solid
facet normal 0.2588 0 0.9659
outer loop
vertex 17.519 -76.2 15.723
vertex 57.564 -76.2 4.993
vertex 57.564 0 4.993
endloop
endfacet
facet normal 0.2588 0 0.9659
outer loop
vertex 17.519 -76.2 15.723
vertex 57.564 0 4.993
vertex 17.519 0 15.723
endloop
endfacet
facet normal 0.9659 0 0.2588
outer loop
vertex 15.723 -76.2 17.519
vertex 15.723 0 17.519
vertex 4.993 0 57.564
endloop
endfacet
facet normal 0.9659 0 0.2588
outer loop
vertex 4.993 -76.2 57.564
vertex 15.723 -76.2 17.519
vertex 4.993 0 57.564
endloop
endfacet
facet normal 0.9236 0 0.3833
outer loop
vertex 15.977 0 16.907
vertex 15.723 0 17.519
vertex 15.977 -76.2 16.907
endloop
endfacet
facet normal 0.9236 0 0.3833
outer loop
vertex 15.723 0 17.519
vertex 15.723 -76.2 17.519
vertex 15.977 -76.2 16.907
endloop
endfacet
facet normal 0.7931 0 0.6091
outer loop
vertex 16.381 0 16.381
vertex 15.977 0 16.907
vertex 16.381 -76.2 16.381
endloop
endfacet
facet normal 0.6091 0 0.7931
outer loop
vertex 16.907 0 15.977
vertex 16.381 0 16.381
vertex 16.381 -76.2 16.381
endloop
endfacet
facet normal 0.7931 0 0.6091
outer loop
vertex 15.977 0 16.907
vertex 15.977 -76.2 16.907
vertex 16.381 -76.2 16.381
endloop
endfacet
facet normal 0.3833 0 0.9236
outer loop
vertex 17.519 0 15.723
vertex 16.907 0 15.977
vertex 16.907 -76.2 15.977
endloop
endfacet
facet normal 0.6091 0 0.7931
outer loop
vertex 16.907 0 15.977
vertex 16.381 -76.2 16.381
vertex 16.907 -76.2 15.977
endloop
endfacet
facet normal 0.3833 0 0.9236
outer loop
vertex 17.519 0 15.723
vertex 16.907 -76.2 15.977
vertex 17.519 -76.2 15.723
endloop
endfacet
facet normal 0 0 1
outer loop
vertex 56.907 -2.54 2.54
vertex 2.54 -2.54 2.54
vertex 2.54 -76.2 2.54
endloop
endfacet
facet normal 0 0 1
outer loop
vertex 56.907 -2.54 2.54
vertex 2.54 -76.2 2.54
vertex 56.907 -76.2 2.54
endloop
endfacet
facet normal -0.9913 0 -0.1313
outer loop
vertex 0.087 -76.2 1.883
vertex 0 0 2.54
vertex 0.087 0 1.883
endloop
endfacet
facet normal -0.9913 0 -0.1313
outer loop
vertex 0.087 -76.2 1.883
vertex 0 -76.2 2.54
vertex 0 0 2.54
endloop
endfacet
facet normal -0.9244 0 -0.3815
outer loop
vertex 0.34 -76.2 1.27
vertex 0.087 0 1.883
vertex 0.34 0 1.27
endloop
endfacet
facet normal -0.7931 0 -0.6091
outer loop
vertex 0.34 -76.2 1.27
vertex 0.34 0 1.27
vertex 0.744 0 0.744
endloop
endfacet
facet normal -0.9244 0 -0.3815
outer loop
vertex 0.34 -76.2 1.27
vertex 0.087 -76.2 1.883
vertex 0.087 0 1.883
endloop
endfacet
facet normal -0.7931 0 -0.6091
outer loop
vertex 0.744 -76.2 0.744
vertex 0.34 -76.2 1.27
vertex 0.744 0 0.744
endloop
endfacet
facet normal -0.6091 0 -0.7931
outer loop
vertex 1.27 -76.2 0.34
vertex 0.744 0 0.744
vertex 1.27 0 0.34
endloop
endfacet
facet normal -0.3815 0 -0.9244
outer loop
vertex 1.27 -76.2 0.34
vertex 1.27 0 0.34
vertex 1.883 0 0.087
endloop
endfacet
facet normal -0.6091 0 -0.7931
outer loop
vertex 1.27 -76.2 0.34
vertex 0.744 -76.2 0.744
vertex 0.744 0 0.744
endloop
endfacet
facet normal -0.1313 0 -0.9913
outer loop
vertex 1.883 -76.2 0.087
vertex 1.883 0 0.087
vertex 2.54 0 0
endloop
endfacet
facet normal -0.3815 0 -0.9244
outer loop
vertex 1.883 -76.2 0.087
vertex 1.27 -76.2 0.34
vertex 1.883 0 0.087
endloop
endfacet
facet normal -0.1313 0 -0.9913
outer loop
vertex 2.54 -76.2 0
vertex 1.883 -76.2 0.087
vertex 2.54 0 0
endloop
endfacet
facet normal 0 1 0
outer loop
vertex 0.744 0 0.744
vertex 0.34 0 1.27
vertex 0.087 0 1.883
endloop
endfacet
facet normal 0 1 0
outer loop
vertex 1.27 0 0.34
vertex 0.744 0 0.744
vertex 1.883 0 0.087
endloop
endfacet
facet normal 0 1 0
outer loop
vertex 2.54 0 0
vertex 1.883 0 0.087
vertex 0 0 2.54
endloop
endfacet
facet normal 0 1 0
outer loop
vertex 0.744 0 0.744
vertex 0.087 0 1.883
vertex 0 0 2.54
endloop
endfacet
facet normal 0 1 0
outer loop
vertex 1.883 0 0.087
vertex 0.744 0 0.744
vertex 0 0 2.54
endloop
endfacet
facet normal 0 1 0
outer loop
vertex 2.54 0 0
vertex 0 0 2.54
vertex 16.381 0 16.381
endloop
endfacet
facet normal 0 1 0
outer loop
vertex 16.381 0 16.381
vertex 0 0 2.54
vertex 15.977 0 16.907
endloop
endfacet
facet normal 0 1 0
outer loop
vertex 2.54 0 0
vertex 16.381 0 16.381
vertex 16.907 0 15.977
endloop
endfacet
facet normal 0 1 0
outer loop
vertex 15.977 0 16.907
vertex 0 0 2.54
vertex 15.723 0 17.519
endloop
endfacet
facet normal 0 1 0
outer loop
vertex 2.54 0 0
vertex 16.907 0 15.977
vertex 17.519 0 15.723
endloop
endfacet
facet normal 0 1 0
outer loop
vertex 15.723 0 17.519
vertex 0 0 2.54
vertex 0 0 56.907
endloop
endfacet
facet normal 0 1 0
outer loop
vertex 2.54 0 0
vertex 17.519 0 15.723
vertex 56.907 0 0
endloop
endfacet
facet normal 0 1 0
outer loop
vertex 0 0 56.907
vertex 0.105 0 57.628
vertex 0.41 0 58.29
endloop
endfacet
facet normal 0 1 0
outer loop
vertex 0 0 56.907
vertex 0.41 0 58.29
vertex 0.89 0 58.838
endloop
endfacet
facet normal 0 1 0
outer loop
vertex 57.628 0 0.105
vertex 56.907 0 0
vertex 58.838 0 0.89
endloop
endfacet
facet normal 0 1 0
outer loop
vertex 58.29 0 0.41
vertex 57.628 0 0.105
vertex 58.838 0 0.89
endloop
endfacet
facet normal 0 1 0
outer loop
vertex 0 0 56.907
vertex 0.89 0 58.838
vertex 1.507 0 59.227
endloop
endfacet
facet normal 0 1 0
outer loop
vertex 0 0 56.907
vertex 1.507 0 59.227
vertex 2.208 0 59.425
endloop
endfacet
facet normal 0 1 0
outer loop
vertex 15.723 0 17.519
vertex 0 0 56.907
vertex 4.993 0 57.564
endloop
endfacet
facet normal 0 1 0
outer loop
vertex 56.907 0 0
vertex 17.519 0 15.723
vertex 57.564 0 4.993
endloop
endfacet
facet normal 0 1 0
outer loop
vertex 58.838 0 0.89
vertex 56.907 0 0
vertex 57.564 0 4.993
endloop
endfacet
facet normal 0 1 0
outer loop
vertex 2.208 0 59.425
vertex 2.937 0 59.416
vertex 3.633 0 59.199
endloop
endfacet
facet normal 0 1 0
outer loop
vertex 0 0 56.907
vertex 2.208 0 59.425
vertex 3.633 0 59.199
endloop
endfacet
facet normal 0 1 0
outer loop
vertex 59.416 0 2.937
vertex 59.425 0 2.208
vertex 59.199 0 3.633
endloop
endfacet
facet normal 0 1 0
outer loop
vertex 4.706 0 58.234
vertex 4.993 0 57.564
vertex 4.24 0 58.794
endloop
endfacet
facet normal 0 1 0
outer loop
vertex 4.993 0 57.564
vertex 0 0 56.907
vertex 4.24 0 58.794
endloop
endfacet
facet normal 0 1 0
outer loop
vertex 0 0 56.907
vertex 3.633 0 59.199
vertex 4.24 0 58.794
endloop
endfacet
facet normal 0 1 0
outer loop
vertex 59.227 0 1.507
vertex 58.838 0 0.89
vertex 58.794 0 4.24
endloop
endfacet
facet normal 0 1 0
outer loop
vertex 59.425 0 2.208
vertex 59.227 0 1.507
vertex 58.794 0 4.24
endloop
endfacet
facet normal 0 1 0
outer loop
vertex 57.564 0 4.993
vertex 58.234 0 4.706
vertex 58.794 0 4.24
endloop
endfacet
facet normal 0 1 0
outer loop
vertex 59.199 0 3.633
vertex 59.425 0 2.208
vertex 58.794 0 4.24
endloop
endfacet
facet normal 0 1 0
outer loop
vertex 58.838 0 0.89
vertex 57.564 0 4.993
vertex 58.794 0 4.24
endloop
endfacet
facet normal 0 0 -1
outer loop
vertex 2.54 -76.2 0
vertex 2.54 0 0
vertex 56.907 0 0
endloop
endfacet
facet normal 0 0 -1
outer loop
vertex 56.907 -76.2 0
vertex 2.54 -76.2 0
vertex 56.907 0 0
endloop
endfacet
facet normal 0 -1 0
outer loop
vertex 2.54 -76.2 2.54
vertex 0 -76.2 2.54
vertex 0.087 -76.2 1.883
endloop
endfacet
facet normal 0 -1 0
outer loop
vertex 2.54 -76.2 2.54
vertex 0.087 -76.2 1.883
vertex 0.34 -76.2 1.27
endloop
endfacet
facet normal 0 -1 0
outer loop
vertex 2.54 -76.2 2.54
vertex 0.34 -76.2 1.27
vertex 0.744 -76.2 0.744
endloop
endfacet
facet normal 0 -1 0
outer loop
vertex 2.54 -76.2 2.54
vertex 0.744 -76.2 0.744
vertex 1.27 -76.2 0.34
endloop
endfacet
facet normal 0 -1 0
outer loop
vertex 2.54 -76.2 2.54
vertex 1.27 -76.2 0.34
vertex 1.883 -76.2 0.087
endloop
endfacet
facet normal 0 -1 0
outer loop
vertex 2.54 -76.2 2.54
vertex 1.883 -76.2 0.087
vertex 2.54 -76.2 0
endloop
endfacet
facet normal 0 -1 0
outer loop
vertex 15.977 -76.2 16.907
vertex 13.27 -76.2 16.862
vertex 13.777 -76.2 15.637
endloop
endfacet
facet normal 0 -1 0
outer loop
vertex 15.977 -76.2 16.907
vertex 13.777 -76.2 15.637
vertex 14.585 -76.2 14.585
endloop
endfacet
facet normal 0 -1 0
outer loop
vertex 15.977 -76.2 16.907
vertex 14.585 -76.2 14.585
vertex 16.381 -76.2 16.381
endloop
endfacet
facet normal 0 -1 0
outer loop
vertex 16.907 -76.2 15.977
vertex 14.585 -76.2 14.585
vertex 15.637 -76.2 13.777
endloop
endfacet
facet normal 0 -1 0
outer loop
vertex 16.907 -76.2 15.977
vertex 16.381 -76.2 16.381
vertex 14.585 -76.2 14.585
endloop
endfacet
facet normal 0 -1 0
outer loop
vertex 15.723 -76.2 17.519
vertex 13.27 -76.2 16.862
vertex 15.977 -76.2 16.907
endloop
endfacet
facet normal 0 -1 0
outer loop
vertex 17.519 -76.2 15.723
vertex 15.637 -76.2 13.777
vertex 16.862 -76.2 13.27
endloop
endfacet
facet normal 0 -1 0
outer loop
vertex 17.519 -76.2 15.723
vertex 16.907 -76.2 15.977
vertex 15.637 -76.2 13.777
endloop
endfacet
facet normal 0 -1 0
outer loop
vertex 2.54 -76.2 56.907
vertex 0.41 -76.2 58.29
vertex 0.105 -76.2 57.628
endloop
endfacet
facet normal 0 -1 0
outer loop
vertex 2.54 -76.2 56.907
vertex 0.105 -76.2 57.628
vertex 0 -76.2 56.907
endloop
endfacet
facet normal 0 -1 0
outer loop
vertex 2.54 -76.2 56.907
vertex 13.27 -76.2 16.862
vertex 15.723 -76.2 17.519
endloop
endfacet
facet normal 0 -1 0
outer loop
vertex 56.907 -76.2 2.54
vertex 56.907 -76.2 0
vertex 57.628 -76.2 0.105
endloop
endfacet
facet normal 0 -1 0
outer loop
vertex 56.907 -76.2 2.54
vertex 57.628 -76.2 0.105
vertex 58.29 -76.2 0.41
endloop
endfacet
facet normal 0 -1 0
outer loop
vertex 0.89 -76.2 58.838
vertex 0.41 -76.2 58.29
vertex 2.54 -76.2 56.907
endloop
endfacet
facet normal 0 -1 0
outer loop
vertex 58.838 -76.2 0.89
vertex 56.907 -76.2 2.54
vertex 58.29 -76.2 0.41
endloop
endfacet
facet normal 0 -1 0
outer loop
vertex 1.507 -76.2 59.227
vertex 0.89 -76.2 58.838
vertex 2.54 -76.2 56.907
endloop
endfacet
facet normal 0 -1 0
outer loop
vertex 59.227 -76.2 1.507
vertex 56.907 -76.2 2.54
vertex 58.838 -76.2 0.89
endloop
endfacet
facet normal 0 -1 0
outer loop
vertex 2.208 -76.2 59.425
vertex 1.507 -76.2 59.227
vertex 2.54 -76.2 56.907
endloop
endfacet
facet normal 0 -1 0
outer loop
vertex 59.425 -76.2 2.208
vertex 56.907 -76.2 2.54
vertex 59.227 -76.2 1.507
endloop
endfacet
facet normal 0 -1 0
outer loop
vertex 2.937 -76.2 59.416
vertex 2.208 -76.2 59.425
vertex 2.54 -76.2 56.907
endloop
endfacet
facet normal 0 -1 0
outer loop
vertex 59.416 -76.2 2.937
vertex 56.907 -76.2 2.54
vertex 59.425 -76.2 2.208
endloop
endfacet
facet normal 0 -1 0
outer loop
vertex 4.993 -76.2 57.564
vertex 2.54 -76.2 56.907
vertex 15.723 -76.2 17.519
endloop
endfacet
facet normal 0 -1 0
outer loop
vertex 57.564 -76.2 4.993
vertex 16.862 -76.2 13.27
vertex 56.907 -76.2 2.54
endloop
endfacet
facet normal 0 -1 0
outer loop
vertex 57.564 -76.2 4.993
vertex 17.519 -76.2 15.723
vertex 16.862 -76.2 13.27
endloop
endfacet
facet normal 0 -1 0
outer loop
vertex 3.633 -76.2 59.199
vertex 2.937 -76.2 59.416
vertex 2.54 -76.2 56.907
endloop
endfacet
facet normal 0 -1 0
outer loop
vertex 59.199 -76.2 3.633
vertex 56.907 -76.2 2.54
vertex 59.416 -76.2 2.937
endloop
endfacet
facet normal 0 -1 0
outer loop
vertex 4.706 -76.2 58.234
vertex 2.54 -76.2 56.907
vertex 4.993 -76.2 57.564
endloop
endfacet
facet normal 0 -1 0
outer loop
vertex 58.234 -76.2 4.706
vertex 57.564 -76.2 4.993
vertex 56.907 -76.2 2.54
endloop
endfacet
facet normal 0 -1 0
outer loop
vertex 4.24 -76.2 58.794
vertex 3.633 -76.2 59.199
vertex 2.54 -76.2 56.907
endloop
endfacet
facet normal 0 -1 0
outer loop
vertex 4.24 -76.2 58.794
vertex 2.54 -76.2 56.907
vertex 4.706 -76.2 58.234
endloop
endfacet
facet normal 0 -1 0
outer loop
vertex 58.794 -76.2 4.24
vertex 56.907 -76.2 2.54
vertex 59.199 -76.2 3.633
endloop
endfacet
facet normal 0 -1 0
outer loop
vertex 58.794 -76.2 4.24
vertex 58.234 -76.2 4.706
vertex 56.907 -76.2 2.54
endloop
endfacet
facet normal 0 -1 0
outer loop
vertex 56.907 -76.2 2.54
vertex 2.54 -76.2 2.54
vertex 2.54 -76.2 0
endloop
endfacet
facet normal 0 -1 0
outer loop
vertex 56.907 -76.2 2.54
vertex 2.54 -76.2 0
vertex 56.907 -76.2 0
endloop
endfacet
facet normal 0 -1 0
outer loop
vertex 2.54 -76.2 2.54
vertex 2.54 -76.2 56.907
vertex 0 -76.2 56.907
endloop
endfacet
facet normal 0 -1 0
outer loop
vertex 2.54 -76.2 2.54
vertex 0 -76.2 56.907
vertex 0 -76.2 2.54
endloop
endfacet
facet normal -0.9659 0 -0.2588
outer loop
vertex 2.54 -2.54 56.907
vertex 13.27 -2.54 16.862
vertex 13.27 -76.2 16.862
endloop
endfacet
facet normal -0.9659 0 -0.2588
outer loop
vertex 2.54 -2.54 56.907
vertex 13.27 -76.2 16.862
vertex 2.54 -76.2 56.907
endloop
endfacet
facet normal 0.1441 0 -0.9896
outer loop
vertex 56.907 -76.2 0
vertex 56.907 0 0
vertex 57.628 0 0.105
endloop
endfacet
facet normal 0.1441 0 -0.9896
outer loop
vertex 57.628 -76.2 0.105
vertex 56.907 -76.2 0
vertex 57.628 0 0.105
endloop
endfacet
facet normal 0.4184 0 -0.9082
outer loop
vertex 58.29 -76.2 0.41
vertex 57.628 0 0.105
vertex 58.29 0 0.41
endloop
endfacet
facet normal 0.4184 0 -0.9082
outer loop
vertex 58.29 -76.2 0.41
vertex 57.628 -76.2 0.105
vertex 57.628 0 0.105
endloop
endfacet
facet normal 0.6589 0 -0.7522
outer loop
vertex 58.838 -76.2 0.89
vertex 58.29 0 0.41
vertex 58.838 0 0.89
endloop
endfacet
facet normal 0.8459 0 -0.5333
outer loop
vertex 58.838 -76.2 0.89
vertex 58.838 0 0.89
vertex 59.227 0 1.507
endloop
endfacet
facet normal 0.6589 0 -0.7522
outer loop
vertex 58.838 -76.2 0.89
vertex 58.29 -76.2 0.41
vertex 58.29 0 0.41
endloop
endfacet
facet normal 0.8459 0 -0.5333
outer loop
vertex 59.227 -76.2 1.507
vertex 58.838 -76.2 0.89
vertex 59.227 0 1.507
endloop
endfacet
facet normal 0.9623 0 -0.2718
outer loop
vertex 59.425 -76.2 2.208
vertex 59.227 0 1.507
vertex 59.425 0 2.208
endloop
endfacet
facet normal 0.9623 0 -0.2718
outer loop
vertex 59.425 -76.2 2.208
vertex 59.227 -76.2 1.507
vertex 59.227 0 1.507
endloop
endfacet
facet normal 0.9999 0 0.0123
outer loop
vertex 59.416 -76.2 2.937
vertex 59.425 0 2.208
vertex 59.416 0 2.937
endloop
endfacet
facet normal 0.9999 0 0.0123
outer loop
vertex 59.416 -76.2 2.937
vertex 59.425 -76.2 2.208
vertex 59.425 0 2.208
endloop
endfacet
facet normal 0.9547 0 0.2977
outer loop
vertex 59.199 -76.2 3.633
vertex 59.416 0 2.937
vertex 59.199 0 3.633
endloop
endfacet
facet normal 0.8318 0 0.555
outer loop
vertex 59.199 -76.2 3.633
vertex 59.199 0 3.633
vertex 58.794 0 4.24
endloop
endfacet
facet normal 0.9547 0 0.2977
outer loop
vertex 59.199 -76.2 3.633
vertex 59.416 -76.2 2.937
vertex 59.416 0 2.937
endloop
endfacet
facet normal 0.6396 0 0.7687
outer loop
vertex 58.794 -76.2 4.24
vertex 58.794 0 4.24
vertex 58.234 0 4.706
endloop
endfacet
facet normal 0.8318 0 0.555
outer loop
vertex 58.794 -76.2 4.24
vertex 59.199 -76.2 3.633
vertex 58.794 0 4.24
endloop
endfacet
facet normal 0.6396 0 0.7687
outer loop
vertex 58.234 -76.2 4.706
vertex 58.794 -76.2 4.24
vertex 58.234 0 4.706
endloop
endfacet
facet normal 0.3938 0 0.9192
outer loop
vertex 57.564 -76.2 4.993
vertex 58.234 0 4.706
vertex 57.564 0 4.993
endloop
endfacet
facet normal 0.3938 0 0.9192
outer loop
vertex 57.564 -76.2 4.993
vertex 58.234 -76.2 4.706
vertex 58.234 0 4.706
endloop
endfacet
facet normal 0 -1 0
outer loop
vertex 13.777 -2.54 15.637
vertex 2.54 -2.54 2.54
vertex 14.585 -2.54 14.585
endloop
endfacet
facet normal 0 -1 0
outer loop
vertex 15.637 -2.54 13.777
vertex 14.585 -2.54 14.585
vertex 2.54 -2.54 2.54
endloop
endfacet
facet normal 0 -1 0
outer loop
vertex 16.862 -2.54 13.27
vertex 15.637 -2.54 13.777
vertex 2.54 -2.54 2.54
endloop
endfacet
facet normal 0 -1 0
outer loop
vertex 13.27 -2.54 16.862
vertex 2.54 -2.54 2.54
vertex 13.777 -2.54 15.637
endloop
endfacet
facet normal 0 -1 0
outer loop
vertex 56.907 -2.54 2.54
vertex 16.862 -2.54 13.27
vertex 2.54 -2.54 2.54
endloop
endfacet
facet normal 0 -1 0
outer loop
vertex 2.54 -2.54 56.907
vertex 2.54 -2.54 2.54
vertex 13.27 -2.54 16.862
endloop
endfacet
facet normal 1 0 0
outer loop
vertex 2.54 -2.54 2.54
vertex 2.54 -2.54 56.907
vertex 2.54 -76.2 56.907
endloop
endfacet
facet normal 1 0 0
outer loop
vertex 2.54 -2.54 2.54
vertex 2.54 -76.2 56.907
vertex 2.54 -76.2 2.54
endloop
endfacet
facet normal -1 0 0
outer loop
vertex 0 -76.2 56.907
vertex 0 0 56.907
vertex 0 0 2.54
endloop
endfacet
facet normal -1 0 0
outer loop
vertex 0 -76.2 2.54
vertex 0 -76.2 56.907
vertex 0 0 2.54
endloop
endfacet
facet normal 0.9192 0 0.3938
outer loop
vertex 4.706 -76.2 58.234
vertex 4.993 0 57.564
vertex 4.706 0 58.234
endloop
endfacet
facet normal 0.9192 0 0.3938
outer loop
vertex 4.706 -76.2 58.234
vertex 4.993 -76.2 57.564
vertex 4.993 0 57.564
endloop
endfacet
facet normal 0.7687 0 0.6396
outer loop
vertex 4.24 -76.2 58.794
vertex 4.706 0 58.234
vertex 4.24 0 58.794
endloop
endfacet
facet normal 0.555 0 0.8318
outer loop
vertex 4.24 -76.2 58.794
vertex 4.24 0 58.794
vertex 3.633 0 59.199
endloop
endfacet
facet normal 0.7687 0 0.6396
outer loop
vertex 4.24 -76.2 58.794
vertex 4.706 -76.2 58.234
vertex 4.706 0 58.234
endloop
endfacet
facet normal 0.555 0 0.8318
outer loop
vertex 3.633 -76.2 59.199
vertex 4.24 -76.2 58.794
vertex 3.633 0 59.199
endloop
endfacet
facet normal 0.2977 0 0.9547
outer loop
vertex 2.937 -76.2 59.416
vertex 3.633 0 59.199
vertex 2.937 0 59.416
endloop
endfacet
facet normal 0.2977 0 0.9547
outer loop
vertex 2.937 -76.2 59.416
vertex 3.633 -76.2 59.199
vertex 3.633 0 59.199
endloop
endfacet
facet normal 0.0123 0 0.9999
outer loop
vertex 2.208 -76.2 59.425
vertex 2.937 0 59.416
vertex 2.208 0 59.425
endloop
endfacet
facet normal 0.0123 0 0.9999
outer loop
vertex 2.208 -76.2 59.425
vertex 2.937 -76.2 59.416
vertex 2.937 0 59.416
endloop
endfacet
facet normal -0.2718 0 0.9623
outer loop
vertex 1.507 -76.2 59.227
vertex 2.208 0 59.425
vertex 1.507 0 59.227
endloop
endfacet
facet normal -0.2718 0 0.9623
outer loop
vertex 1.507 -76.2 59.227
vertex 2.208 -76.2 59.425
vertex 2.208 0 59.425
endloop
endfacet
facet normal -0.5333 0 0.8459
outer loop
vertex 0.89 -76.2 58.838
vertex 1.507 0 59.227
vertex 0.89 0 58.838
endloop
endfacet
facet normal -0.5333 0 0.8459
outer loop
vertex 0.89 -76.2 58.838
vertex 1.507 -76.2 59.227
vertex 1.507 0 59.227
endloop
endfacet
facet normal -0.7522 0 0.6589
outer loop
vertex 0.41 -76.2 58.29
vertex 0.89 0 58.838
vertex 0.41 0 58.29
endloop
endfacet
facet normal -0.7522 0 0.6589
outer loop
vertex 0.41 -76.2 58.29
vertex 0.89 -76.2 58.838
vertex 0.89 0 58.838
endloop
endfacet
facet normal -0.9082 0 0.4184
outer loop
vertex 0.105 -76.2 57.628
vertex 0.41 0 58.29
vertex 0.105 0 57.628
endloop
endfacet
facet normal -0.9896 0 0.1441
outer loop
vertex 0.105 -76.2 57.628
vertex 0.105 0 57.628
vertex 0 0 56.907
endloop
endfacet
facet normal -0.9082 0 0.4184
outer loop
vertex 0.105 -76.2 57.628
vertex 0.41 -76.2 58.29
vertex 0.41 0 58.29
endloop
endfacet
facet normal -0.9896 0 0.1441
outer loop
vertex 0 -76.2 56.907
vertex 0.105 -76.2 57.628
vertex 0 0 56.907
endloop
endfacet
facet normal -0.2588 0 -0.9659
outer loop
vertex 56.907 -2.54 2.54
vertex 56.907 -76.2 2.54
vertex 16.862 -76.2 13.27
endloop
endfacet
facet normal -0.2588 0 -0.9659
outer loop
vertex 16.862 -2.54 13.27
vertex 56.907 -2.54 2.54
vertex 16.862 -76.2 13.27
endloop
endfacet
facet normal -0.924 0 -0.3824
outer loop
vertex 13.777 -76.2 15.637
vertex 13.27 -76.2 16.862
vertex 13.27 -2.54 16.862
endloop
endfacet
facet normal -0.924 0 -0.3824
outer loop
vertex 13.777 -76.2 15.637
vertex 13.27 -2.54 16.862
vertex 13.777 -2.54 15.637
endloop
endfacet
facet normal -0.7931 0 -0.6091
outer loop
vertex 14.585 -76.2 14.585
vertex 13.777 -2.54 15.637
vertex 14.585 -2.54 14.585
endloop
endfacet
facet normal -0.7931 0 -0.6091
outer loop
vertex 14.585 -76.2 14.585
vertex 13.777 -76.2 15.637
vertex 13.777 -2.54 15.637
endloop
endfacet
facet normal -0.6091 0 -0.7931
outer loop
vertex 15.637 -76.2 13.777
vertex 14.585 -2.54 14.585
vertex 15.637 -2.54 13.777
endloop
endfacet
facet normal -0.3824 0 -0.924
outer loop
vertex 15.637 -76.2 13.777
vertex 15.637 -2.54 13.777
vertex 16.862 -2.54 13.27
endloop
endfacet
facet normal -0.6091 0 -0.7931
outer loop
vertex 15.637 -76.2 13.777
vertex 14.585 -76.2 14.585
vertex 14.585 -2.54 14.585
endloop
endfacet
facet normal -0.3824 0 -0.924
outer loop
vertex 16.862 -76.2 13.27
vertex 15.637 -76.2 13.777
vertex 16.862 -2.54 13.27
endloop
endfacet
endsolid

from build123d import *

# Parameters (mm, degrees)
F1_DEPTH = 76.2
F2_R     = 2.54
F3_T     = 2.54


# Not quite as in the source:
# - a shell that OpenCascade refuses in one call is made with other operations: the cavity is built on its own and cut out


with BuildPart() as f1:
    # F0 (on Front) → F1 (new body)
    with BuildSketch(Plane.XZ):
        Polygon((16.1029547439, 16.1029547439), (0, 76.2), (0, 0), (76.2, 0), align=None)
    extrude(amount=F1_DEPTH)

    # F2
    f2_edges = [f1.edges().sort_by_distance(p)[0] for p in [
        (0, -38.1, 76.2),
        (76.2, -38.1, 0),
        (16.102955, -38.1, 16.102955),
        (0, -38.1, 0),
    ]]
    fillet(f2_edges, radius=F2_R)

    # F3: shell of thickness 2.54, made by hand


with BuildPart() as f3_core1:
    # F3_t2: copy of F1
    add(f1.part)

    # the walls: a layer under each face that stays
    f3_faces = [f3_core1.faces().sort_by_distance(p)[0] for p in [
        (10.3584280297, -38.1, 37.5418203066),
        (9.9077974256, 0, 9.9077974256),
        (16.3808048352, -38.1, 16.3808048352),
        (37.5418203066, -38.1, 10.3584280297),
        (0, -38.1, 29.7233922768),
        (29.7233922768, -38.1, 0),
    ]]
    thicken(f3_faces, amount=-F3_T, mode=Mode.SUBTRACT)


with BuildPart() as f1_1:
    add(f1.part)

    # what is left inside the walls is the cavity
    f3_cavity = [f3_core1.part.solids().sort_by_distance(p)[0] for p in [
        (29.723392, -51.646667, 2.5654),
    ]]
    add(f3_cavity, mode=Mode.SUBTRACT)


solid = f1_1.part
